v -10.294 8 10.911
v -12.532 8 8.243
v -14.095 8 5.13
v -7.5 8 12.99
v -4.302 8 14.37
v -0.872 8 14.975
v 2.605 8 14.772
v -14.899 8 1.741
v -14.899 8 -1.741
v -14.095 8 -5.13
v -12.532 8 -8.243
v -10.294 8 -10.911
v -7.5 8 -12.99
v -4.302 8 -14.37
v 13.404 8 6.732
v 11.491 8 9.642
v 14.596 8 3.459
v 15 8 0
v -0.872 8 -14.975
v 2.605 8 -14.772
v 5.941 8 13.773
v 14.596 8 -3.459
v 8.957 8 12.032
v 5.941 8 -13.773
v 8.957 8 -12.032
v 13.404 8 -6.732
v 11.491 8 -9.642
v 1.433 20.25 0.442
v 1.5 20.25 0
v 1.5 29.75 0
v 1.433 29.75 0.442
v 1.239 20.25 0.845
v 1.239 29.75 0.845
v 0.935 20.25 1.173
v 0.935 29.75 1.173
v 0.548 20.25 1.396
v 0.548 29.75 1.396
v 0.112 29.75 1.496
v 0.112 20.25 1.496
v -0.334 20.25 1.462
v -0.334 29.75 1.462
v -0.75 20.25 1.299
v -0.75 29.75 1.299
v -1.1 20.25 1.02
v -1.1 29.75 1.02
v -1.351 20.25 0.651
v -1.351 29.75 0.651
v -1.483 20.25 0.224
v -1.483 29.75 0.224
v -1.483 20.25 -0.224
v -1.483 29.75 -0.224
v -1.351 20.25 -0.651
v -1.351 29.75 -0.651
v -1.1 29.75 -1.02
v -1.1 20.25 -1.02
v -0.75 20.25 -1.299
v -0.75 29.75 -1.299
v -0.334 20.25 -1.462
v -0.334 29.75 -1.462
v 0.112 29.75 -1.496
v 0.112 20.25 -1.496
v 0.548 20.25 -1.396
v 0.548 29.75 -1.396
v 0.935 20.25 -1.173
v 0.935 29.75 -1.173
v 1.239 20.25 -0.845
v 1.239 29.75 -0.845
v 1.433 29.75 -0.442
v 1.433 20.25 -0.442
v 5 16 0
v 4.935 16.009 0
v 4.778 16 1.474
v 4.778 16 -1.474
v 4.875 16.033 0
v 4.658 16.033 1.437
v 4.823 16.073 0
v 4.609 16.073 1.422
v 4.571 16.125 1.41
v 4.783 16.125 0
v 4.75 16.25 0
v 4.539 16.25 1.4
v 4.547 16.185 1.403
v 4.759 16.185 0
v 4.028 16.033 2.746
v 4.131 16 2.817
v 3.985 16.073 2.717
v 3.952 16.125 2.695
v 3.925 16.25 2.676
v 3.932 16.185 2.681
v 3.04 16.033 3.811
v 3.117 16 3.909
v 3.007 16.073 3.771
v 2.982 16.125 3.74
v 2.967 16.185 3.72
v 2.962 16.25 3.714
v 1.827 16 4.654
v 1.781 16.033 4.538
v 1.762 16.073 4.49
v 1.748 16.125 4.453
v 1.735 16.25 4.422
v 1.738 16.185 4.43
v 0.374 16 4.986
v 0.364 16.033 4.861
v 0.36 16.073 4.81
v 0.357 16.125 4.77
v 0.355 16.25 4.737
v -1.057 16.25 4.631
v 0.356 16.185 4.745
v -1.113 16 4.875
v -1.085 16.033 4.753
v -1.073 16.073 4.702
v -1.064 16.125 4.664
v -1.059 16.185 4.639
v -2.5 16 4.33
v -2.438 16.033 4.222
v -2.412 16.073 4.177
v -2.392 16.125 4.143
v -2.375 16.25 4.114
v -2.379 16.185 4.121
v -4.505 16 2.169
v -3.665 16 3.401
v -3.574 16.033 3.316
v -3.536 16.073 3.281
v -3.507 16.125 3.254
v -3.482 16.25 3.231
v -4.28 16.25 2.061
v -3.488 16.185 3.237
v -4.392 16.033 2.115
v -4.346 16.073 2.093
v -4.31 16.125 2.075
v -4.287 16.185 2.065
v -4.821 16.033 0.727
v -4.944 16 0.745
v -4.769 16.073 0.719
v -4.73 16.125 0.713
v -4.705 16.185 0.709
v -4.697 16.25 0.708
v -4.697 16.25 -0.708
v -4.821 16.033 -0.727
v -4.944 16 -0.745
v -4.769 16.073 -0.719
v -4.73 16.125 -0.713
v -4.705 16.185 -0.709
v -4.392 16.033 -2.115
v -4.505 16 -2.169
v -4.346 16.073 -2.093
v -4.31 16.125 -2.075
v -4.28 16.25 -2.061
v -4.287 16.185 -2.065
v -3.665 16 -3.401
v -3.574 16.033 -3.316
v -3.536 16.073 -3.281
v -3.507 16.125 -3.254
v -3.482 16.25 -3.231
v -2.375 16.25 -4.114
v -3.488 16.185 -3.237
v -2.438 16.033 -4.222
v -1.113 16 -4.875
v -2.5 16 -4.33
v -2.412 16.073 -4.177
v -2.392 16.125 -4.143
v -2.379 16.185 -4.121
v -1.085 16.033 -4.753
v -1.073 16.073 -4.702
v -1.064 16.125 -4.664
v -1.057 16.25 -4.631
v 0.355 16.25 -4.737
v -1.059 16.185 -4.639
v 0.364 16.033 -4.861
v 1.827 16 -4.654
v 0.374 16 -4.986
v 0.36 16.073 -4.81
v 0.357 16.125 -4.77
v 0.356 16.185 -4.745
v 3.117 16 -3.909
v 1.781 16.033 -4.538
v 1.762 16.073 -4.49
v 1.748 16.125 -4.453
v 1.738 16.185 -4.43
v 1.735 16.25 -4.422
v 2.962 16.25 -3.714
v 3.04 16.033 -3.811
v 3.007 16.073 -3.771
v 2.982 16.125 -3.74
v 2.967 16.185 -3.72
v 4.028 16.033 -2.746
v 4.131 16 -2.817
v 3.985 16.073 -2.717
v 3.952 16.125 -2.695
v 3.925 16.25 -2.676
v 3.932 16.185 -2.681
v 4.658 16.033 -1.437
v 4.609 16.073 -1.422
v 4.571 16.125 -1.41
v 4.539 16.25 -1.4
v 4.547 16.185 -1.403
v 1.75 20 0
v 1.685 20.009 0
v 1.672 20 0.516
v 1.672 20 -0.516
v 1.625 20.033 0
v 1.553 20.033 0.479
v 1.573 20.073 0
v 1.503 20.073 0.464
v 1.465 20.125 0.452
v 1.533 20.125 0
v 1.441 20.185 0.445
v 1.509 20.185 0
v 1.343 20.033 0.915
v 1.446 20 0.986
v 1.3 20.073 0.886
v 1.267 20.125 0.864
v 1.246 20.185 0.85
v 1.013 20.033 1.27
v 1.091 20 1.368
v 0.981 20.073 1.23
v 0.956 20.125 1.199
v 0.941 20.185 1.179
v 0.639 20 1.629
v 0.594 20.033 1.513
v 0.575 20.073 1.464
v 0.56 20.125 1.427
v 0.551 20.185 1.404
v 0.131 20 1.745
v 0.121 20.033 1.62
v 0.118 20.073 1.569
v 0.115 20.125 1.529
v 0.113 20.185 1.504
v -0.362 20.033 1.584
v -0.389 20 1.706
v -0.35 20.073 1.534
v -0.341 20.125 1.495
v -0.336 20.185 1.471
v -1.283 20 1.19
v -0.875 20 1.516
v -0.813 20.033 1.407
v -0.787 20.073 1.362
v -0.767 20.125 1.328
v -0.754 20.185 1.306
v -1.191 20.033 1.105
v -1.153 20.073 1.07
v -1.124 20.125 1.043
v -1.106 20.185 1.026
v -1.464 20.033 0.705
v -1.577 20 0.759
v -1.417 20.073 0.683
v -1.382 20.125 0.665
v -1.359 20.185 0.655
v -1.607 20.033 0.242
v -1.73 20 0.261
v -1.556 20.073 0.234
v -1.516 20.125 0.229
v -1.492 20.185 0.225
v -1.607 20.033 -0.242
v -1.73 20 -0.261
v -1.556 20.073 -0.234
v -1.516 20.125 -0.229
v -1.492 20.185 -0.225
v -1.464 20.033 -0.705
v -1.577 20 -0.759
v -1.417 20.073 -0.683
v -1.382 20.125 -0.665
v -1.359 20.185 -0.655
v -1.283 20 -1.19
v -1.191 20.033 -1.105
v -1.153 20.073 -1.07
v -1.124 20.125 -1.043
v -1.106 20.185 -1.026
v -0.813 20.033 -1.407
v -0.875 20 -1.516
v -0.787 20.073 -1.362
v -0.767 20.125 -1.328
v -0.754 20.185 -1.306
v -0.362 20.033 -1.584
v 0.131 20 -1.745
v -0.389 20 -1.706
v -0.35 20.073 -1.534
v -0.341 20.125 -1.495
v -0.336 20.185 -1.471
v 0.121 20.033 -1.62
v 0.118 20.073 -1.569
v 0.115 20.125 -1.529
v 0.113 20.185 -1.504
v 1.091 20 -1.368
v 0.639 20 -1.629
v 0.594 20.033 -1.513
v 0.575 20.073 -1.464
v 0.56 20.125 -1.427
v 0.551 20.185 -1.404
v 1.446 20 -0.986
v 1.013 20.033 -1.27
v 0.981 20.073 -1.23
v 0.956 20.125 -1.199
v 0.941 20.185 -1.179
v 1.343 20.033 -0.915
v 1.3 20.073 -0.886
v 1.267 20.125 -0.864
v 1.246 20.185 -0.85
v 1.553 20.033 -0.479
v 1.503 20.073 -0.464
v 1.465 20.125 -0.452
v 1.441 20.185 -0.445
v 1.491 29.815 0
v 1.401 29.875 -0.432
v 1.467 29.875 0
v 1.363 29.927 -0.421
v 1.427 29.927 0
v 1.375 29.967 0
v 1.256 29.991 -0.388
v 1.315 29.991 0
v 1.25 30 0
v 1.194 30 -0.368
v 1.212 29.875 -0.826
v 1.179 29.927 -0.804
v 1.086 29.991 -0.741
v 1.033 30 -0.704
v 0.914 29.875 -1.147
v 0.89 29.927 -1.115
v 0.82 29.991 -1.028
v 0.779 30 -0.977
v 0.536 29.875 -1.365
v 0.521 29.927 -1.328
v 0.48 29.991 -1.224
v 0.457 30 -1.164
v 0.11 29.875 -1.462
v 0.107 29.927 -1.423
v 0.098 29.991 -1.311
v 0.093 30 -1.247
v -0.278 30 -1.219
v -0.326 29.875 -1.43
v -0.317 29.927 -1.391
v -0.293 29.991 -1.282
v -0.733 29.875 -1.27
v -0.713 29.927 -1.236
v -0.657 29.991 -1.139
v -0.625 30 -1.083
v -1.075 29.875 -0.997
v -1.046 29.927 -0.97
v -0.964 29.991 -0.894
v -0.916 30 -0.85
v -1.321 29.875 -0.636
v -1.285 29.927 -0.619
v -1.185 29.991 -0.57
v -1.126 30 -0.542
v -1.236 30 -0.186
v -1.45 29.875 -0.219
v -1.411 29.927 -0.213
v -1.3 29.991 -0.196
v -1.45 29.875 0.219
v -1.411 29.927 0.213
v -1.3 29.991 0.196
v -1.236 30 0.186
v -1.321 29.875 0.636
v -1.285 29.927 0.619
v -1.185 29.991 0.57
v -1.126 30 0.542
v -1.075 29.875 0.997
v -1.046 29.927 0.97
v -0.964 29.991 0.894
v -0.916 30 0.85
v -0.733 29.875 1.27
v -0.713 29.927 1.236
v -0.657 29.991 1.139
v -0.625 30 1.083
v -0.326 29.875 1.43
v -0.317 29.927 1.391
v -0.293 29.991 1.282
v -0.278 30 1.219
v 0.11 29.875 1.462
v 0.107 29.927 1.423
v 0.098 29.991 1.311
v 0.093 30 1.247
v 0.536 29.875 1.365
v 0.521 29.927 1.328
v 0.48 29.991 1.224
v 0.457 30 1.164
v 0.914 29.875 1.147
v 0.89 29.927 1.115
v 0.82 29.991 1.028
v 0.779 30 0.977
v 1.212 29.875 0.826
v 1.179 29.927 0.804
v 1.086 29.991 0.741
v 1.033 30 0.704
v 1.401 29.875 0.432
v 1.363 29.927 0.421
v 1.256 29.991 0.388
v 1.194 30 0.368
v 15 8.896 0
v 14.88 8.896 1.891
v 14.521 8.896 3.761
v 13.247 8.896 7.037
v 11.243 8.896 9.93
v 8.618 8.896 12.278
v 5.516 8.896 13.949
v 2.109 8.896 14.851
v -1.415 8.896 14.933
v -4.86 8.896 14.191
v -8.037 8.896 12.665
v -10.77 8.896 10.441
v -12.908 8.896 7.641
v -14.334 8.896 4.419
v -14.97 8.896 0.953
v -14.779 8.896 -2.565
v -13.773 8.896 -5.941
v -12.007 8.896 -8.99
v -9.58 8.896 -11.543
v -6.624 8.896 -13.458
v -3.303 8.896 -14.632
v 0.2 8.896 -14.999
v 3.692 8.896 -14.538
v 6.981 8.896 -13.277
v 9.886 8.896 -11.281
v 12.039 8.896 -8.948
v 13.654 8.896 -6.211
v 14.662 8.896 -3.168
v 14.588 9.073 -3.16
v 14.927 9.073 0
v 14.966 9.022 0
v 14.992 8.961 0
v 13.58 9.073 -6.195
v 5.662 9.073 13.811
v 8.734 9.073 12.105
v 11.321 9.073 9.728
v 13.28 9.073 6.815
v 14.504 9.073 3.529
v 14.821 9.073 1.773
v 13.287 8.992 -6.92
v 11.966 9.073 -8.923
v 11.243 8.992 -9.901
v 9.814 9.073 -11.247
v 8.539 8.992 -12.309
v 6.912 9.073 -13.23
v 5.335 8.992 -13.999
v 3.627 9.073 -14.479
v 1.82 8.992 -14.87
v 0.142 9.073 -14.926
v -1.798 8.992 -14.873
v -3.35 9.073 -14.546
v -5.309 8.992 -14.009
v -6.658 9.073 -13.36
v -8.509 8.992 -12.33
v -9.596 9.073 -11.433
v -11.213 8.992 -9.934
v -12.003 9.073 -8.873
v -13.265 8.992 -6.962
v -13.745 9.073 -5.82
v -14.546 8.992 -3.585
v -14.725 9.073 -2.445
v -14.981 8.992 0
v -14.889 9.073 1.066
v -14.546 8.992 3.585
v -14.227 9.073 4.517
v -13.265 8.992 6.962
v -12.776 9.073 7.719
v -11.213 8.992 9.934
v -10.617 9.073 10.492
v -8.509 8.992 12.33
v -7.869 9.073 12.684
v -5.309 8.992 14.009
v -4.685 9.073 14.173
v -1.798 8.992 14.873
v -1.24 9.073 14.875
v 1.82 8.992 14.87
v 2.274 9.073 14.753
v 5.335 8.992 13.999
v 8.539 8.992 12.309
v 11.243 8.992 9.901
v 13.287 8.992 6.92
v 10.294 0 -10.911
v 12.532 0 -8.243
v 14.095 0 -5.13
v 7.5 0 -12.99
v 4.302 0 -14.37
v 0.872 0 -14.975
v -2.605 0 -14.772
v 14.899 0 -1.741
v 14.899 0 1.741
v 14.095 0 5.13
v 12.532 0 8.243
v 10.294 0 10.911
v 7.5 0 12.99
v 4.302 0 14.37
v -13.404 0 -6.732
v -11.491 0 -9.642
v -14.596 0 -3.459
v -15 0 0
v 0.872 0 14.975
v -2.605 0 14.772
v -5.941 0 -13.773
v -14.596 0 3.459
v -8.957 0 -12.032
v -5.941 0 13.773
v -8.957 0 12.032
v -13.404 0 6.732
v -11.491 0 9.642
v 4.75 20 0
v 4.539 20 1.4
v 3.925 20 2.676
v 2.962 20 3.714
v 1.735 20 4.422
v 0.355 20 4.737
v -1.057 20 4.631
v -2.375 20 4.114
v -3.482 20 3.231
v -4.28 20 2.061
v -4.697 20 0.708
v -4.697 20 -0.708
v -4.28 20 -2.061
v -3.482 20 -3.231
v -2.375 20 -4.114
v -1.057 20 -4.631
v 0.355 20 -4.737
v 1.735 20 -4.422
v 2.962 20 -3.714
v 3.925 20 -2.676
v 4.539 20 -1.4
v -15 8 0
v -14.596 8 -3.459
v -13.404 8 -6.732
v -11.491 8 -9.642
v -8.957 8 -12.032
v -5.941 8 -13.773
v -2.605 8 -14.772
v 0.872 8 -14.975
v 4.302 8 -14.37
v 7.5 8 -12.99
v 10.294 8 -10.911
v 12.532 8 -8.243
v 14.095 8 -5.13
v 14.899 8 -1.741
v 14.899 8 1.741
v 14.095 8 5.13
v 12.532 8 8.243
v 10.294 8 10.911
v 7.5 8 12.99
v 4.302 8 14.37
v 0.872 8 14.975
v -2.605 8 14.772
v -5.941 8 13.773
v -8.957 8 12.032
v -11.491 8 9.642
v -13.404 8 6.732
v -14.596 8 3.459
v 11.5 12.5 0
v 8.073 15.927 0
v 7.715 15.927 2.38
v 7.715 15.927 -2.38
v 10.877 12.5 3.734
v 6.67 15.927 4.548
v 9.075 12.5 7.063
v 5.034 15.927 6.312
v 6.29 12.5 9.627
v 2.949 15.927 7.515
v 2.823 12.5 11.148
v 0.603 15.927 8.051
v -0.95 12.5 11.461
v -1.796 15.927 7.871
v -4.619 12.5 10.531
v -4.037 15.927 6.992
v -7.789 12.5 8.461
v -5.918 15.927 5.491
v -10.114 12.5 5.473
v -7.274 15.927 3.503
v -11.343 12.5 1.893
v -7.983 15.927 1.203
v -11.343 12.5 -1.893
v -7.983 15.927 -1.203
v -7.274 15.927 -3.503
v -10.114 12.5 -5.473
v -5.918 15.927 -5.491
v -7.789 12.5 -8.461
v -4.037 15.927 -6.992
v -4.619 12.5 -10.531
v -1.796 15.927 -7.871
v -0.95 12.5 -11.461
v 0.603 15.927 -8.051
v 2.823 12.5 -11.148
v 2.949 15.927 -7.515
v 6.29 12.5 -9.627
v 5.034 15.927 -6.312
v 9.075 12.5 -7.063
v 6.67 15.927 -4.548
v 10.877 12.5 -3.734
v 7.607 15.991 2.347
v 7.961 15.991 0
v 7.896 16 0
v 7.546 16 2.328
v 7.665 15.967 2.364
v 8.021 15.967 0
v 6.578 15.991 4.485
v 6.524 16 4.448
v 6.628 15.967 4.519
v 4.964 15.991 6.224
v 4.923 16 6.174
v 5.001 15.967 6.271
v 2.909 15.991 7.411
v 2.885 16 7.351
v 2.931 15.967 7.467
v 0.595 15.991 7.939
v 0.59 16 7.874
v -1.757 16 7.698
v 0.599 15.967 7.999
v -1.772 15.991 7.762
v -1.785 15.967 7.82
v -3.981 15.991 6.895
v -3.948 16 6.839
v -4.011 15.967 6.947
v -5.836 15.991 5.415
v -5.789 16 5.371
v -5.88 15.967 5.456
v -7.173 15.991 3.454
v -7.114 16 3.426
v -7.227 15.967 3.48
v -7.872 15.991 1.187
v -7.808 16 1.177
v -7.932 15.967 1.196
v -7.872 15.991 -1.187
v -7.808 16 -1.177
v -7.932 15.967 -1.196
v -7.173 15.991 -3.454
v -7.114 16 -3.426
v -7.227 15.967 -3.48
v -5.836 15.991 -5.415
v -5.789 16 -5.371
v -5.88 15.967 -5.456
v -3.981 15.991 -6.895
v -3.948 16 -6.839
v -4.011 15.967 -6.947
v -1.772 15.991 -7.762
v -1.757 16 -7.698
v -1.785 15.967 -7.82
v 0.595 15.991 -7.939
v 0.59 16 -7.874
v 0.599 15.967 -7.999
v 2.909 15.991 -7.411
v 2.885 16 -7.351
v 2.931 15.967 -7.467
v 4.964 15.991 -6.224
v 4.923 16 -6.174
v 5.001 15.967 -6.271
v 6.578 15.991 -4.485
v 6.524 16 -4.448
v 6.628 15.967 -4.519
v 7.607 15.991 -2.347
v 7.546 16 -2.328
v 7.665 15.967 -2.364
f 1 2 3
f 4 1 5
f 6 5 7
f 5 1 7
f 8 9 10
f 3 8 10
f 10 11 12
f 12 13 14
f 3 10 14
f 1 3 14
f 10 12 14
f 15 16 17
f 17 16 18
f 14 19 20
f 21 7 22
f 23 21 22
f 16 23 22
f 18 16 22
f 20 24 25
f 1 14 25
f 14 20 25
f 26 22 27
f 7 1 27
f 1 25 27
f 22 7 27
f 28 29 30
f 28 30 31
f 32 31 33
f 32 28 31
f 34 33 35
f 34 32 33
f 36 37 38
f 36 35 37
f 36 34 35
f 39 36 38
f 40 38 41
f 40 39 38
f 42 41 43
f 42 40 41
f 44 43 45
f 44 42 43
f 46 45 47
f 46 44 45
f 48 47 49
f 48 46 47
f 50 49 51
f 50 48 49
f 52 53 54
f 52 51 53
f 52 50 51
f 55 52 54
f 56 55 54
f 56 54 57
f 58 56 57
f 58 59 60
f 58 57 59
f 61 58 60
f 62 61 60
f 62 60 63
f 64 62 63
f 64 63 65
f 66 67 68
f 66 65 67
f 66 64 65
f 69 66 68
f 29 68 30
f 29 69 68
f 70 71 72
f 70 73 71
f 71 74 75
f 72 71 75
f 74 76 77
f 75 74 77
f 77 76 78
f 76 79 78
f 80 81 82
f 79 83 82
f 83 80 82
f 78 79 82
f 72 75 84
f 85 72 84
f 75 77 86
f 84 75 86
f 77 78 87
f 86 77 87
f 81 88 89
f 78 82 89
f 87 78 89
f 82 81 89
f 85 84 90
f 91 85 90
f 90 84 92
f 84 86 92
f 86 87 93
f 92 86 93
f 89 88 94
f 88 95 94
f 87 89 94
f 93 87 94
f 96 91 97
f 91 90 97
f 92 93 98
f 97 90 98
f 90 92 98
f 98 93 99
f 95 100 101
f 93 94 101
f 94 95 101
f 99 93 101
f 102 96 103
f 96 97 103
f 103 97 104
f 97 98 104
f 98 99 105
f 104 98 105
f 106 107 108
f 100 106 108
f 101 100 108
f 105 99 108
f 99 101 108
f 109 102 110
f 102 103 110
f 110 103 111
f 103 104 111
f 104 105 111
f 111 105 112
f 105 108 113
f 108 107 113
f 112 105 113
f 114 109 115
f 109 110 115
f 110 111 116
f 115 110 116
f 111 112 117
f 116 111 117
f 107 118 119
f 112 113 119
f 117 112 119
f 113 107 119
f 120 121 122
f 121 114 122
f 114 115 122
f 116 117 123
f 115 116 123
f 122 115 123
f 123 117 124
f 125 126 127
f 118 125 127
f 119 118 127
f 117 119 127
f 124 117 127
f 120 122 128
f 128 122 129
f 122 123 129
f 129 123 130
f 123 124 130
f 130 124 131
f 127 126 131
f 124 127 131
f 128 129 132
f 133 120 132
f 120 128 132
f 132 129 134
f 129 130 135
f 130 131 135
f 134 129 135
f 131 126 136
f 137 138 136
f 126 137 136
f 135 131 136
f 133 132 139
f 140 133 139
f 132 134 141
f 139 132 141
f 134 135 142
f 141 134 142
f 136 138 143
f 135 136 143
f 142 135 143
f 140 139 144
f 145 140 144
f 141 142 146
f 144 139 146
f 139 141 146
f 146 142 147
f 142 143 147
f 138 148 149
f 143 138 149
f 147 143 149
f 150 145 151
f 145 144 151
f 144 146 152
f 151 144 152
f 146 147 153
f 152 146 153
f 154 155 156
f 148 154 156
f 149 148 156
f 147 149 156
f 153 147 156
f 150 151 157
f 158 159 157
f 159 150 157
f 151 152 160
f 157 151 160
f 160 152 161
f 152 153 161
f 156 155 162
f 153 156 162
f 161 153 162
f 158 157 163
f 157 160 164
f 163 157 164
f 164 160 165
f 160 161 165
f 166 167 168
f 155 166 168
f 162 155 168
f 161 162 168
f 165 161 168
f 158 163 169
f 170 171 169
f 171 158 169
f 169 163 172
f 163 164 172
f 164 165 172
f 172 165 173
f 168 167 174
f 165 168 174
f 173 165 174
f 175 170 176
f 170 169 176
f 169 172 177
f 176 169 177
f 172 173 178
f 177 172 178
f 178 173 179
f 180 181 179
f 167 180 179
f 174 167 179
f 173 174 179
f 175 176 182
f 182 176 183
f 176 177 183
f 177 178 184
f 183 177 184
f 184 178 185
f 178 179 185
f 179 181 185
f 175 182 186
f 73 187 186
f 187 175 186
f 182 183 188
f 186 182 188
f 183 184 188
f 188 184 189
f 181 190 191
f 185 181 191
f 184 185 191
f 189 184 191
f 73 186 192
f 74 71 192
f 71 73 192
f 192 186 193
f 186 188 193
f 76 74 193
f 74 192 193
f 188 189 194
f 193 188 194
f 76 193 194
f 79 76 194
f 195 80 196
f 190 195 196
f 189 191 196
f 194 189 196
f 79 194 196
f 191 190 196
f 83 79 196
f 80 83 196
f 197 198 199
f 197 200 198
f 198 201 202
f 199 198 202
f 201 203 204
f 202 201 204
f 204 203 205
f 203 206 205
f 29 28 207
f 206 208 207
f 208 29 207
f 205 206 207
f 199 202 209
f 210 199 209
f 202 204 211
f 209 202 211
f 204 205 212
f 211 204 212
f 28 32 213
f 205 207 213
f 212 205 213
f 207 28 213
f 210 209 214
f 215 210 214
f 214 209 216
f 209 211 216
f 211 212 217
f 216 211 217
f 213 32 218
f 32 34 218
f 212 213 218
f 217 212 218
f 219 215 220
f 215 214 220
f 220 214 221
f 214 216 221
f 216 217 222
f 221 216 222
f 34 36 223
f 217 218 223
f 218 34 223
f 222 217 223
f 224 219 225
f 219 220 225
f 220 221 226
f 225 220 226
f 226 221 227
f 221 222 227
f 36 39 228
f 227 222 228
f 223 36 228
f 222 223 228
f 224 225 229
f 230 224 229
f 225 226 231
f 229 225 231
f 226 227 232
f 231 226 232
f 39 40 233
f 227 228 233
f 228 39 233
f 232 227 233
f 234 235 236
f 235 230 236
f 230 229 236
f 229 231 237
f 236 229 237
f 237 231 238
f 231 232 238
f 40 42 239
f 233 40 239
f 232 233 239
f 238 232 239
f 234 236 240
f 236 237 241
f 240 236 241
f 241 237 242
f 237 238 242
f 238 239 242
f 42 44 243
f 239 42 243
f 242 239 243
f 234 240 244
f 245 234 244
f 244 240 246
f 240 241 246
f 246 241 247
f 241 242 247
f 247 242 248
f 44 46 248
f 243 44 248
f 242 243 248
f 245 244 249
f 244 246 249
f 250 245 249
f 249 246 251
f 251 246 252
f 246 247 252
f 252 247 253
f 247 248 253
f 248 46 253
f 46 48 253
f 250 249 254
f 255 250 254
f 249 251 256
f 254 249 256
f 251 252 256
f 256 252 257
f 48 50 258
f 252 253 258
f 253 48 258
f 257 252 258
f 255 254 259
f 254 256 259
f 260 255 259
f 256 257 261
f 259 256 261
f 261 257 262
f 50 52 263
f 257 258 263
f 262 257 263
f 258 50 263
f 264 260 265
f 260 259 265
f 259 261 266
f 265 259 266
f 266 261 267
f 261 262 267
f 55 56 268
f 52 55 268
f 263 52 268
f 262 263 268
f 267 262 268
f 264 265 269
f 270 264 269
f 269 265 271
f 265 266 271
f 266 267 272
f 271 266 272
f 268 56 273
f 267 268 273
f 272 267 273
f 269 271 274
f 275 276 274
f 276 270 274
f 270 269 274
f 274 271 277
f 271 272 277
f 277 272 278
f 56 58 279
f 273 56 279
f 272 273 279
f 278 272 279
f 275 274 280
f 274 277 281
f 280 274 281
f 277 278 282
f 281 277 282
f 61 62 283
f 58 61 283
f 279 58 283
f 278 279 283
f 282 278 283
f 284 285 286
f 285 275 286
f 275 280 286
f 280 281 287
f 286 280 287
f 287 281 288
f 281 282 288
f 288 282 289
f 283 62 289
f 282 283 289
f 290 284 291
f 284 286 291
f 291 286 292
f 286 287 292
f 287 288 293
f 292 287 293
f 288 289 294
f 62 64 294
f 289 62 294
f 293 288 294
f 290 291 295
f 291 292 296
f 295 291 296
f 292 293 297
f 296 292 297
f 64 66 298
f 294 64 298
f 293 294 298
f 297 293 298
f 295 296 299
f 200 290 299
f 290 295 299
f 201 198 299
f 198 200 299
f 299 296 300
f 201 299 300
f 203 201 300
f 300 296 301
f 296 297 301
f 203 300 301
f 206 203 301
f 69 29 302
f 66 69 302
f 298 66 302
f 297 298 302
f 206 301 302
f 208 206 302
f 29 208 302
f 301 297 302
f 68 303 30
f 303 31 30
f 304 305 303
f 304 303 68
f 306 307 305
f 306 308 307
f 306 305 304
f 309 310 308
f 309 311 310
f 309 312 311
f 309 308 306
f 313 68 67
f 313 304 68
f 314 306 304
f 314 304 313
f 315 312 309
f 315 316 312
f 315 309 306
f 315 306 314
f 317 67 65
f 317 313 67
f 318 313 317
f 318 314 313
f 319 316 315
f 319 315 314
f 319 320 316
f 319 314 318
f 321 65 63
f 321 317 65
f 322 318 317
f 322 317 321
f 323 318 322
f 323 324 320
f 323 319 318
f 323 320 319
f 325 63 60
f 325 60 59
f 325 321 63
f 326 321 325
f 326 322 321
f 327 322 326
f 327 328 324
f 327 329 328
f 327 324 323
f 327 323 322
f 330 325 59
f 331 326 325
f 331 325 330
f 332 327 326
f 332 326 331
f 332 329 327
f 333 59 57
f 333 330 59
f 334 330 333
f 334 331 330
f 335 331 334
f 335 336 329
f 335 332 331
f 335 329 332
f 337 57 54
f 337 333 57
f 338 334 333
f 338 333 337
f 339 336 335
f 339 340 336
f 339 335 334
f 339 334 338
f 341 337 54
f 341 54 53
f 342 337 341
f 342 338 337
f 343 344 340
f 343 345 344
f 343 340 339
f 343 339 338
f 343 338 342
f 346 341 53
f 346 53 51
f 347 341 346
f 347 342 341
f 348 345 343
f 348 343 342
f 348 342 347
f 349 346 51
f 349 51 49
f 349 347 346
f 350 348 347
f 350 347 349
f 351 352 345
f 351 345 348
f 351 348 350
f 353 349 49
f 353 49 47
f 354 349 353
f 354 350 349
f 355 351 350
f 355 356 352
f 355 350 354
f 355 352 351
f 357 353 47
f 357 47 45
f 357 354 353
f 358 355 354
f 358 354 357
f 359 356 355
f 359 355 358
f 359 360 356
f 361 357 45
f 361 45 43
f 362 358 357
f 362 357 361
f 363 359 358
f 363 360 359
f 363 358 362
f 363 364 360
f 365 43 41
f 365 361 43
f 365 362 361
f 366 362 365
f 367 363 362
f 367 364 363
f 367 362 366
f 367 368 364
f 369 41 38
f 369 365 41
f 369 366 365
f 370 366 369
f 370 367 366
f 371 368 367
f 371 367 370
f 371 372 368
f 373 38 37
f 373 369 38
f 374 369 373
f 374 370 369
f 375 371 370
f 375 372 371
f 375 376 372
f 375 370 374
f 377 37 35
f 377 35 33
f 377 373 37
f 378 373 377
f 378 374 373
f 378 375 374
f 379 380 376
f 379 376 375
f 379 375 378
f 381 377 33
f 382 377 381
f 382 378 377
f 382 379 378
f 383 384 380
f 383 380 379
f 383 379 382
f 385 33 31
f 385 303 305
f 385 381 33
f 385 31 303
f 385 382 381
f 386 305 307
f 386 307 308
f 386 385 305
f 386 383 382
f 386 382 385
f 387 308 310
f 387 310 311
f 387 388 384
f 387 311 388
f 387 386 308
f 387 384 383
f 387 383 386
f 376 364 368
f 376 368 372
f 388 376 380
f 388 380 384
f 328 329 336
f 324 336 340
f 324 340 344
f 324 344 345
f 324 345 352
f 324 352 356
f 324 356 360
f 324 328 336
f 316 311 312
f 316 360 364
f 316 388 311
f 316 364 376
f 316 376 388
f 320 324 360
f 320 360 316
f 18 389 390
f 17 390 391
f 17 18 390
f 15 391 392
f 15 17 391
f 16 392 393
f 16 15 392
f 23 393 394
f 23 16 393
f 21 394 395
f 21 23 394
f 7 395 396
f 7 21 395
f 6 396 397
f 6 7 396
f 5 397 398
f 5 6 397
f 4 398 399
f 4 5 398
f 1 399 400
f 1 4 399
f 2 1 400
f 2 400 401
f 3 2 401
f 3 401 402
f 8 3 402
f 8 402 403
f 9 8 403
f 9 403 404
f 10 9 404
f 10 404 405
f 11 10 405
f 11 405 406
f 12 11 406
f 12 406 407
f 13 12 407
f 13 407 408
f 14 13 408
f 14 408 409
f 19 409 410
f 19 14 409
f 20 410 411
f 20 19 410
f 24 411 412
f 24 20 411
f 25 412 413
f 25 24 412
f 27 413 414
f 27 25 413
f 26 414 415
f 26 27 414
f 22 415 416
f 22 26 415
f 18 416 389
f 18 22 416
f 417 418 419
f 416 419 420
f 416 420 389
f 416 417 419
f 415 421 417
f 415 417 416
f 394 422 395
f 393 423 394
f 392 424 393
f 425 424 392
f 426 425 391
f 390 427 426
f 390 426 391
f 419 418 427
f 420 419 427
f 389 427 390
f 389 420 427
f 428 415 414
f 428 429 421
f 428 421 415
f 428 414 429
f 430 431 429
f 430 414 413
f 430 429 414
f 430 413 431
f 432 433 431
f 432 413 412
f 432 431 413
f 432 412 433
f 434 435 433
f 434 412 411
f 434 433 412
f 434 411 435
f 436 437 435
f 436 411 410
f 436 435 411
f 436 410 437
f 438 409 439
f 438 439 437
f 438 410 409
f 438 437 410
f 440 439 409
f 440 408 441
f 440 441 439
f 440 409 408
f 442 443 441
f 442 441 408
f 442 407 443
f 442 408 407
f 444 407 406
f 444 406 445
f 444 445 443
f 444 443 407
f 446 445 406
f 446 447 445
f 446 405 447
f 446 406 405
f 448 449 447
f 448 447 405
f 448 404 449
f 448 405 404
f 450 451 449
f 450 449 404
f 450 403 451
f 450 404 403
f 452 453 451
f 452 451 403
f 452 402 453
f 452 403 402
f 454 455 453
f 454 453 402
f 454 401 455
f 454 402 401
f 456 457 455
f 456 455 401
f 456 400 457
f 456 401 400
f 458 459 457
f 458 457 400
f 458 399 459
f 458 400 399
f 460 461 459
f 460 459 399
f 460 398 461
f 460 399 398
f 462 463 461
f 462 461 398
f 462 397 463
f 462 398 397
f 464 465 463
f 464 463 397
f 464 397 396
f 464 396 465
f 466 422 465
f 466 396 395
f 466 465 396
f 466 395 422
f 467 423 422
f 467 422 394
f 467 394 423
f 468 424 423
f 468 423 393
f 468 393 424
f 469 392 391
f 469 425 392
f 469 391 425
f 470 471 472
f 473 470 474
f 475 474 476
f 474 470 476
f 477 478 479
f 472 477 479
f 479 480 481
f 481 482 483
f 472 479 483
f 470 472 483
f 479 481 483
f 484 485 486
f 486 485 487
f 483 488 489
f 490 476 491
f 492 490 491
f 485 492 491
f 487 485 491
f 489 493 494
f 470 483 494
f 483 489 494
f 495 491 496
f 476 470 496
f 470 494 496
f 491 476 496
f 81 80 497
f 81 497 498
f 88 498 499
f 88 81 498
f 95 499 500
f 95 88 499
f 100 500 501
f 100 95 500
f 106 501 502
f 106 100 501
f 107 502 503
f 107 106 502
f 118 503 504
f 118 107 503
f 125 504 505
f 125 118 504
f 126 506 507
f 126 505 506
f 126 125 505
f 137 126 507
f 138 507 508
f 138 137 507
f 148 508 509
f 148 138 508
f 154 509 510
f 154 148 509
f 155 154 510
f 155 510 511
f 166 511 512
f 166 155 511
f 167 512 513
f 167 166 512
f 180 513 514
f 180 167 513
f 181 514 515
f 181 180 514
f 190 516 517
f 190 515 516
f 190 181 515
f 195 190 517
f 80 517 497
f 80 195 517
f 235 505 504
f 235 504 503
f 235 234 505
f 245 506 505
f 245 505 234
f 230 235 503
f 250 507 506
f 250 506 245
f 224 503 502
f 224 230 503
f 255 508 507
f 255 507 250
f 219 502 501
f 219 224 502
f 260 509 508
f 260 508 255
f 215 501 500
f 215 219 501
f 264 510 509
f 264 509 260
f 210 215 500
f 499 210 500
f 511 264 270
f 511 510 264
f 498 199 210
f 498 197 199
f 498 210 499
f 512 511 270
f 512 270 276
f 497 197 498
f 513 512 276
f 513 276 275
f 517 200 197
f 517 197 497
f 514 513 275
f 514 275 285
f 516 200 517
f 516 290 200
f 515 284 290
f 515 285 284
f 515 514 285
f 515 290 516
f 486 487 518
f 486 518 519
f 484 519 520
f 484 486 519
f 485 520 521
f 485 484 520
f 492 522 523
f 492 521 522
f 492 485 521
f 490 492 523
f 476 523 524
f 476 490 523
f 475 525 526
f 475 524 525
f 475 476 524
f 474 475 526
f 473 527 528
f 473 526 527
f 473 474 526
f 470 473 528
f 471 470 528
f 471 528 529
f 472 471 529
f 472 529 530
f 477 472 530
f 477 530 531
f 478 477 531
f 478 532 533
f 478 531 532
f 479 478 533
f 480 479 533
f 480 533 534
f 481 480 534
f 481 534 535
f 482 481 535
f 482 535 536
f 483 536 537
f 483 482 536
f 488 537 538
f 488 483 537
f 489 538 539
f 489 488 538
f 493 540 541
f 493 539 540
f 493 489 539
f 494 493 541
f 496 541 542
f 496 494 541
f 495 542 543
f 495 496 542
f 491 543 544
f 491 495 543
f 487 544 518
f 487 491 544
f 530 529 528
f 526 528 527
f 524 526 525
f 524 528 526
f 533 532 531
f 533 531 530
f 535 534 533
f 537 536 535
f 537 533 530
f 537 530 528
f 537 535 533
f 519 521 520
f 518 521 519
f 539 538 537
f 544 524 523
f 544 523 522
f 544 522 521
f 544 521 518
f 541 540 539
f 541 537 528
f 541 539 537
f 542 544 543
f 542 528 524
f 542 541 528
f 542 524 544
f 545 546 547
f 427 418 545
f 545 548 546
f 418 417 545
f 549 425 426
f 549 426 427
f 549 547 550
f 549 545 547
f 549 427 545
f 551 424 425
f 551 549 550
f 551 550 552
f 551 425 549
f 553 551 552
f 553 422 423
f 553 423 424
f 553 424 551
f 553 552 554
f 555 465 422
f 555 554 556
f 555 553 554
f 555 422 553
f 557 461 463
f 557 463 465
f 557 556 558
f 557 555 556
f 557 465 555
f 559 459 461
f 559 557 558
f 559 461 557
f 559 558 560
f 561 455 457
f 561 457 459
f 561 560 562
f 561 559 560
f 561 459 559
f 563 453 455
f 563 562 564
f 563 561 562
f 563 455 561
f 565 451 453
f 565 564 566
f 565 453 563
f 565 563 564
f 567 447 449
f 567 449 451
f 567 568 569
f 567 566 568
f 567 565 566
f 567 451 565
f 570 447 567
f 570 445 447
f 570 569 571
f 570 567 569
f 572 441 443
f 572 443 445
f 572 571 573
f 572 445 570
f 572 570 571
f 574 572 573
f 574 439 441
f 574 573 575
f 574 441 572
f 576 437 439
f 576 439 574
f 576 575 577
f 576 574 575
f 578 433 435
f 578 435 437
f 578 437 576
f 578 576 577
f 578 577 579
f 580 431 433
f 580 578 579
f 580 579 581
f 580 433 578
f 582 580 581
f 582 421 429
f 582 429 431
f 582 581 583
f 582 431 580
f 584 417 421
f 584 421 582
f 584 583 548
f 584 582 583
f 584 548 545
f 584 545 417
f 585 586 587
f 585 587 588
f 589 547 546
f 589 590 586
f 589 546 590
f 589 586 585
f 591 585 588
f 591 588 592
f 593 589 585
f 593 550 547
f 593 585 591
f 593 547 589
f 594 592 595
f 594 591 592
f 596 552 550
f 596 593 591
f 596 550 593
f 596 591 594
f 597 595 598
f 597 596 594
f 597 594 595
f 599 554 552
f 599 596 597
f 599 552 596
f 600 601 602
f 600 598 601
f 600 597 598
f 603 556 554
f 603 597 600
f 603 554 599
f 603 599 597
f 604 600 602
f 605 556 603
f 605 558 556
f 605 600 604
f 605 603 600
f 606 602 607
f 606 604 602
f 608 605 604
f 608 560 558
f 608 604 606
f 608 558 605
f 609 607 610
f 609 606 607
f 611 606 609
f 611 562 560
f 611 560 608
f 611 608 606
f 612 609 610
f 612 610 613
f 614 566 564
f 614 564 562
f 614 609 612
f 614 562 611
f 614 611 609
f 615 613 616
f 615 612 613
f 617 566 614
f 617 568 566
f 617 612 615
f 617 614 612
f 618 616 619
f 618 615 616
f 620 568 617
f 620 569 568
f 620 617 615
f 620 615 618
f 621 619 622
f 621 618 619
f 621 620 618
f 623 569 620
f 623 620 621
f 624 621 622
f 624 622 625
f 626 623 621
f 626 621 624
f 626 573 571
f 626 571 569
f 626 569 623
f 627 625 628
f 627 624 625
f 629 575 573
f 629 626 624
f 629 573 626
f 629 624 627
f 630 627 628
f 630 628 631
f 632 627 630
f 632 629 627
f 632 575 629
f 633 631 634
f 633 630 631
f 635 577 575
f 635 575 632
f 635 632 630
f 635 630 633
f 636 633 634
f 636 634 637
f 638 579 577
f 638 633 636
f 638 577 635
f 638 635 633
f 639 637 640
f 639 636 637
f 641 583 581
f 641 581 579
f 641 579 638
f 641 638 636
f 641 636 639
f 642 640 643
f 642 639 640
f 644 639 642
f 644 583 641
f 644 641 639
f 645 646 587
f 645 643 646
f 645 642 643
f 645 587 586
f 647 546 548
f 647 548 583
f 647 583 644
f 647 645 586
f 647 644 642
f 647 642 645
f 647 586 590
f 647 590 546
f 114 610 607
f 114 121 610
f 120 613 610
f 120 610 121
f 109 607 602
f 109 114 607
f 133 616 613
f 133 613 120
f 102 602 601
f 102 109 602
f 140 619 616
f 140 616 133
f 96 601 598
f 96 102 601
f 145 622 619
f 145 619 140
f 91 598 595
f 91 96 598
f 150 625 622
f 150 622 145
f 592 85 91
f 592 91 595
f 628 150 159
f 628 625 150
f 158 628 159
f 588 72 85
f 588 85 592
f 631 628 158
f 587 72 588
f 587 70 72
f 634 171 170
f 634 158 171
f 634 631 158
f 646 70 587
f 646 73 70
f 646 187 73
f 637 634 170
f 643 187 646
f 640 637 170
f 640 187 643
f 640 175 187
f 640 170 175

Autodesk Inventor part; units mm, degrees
ref_plane "YZ Plane" through (0, 0, 0) normal (1, 0, 0) x (0, 1, 0)
ref_plane "XZ Plane" through (0, 0, 0) normal (0, 1, 0) x (-1, 0, 0)
ref_plane "XY Plane" through (0, 0, 0) normal (0, 0, 1) x (1, 0, 0)
sketch "Szkic1" plane through (0, 0, 0) normal (0, 1, 0) x (-1, 0, 0)
  circle A0 centre (0, 0) radius 15
  dimension "d0" = 30
extrude "Wyciągnięcie proste1" add sketch "Szkic1" along normal blind 8
sketch "Szkic2" plane through (0, 8, 0) normal (0, 1, 0) x (1, 0, 0)
  circle A0 centre (0, 0) radius 15 projected
extrude "Wyciągnięcie proste2" add sketch "Szkic2" along normal blind 8 separate body
chamfer "Faza1" distance 7 angle 45 1 edges at (-15, 16, 0)
sketch "Szkic3" plane through (0, 16, 0) normal (0, 1, 0) x (1, 0, 0)
  circle A0 centre (0, 0) radius 8 projected
  circle A1 centre (0, 0) radius 4.75
  dimension "d8" = 9.5
extrude "Wyciągnięcie proste3" add sketch "Szkic3" along normal blind 4 contours A1 bodies 2
fillet "Zaokrąglenie1" radius 0.25 1 edges at (-4.75, 16, 0)
fillet "Zaokrąglenie2" radius 0.25 2 edges at (-15, 9, 0) (-8, 16, 0)
sketch "Szkic4" plane through (0, 20, 0) normal (0, 1, 0) x (1, 0, 0)
  circle A0 centre (0, 0) radius 4.75 projected
  circle A1 centre (0, 0) radius 1.5
  dimension "d13" = 3
extrude "Wyciągnięcie proste4" add sketch "Szkic4" along normal blind 10 contours A1 bodies 2
fillet "Zaokrąglenie3" radius 0.25 2 edges at (-1.5, 20, 0) (-1.5, 30, 0)
properties part number "Wirnik" material "Stal nierdzewna"
